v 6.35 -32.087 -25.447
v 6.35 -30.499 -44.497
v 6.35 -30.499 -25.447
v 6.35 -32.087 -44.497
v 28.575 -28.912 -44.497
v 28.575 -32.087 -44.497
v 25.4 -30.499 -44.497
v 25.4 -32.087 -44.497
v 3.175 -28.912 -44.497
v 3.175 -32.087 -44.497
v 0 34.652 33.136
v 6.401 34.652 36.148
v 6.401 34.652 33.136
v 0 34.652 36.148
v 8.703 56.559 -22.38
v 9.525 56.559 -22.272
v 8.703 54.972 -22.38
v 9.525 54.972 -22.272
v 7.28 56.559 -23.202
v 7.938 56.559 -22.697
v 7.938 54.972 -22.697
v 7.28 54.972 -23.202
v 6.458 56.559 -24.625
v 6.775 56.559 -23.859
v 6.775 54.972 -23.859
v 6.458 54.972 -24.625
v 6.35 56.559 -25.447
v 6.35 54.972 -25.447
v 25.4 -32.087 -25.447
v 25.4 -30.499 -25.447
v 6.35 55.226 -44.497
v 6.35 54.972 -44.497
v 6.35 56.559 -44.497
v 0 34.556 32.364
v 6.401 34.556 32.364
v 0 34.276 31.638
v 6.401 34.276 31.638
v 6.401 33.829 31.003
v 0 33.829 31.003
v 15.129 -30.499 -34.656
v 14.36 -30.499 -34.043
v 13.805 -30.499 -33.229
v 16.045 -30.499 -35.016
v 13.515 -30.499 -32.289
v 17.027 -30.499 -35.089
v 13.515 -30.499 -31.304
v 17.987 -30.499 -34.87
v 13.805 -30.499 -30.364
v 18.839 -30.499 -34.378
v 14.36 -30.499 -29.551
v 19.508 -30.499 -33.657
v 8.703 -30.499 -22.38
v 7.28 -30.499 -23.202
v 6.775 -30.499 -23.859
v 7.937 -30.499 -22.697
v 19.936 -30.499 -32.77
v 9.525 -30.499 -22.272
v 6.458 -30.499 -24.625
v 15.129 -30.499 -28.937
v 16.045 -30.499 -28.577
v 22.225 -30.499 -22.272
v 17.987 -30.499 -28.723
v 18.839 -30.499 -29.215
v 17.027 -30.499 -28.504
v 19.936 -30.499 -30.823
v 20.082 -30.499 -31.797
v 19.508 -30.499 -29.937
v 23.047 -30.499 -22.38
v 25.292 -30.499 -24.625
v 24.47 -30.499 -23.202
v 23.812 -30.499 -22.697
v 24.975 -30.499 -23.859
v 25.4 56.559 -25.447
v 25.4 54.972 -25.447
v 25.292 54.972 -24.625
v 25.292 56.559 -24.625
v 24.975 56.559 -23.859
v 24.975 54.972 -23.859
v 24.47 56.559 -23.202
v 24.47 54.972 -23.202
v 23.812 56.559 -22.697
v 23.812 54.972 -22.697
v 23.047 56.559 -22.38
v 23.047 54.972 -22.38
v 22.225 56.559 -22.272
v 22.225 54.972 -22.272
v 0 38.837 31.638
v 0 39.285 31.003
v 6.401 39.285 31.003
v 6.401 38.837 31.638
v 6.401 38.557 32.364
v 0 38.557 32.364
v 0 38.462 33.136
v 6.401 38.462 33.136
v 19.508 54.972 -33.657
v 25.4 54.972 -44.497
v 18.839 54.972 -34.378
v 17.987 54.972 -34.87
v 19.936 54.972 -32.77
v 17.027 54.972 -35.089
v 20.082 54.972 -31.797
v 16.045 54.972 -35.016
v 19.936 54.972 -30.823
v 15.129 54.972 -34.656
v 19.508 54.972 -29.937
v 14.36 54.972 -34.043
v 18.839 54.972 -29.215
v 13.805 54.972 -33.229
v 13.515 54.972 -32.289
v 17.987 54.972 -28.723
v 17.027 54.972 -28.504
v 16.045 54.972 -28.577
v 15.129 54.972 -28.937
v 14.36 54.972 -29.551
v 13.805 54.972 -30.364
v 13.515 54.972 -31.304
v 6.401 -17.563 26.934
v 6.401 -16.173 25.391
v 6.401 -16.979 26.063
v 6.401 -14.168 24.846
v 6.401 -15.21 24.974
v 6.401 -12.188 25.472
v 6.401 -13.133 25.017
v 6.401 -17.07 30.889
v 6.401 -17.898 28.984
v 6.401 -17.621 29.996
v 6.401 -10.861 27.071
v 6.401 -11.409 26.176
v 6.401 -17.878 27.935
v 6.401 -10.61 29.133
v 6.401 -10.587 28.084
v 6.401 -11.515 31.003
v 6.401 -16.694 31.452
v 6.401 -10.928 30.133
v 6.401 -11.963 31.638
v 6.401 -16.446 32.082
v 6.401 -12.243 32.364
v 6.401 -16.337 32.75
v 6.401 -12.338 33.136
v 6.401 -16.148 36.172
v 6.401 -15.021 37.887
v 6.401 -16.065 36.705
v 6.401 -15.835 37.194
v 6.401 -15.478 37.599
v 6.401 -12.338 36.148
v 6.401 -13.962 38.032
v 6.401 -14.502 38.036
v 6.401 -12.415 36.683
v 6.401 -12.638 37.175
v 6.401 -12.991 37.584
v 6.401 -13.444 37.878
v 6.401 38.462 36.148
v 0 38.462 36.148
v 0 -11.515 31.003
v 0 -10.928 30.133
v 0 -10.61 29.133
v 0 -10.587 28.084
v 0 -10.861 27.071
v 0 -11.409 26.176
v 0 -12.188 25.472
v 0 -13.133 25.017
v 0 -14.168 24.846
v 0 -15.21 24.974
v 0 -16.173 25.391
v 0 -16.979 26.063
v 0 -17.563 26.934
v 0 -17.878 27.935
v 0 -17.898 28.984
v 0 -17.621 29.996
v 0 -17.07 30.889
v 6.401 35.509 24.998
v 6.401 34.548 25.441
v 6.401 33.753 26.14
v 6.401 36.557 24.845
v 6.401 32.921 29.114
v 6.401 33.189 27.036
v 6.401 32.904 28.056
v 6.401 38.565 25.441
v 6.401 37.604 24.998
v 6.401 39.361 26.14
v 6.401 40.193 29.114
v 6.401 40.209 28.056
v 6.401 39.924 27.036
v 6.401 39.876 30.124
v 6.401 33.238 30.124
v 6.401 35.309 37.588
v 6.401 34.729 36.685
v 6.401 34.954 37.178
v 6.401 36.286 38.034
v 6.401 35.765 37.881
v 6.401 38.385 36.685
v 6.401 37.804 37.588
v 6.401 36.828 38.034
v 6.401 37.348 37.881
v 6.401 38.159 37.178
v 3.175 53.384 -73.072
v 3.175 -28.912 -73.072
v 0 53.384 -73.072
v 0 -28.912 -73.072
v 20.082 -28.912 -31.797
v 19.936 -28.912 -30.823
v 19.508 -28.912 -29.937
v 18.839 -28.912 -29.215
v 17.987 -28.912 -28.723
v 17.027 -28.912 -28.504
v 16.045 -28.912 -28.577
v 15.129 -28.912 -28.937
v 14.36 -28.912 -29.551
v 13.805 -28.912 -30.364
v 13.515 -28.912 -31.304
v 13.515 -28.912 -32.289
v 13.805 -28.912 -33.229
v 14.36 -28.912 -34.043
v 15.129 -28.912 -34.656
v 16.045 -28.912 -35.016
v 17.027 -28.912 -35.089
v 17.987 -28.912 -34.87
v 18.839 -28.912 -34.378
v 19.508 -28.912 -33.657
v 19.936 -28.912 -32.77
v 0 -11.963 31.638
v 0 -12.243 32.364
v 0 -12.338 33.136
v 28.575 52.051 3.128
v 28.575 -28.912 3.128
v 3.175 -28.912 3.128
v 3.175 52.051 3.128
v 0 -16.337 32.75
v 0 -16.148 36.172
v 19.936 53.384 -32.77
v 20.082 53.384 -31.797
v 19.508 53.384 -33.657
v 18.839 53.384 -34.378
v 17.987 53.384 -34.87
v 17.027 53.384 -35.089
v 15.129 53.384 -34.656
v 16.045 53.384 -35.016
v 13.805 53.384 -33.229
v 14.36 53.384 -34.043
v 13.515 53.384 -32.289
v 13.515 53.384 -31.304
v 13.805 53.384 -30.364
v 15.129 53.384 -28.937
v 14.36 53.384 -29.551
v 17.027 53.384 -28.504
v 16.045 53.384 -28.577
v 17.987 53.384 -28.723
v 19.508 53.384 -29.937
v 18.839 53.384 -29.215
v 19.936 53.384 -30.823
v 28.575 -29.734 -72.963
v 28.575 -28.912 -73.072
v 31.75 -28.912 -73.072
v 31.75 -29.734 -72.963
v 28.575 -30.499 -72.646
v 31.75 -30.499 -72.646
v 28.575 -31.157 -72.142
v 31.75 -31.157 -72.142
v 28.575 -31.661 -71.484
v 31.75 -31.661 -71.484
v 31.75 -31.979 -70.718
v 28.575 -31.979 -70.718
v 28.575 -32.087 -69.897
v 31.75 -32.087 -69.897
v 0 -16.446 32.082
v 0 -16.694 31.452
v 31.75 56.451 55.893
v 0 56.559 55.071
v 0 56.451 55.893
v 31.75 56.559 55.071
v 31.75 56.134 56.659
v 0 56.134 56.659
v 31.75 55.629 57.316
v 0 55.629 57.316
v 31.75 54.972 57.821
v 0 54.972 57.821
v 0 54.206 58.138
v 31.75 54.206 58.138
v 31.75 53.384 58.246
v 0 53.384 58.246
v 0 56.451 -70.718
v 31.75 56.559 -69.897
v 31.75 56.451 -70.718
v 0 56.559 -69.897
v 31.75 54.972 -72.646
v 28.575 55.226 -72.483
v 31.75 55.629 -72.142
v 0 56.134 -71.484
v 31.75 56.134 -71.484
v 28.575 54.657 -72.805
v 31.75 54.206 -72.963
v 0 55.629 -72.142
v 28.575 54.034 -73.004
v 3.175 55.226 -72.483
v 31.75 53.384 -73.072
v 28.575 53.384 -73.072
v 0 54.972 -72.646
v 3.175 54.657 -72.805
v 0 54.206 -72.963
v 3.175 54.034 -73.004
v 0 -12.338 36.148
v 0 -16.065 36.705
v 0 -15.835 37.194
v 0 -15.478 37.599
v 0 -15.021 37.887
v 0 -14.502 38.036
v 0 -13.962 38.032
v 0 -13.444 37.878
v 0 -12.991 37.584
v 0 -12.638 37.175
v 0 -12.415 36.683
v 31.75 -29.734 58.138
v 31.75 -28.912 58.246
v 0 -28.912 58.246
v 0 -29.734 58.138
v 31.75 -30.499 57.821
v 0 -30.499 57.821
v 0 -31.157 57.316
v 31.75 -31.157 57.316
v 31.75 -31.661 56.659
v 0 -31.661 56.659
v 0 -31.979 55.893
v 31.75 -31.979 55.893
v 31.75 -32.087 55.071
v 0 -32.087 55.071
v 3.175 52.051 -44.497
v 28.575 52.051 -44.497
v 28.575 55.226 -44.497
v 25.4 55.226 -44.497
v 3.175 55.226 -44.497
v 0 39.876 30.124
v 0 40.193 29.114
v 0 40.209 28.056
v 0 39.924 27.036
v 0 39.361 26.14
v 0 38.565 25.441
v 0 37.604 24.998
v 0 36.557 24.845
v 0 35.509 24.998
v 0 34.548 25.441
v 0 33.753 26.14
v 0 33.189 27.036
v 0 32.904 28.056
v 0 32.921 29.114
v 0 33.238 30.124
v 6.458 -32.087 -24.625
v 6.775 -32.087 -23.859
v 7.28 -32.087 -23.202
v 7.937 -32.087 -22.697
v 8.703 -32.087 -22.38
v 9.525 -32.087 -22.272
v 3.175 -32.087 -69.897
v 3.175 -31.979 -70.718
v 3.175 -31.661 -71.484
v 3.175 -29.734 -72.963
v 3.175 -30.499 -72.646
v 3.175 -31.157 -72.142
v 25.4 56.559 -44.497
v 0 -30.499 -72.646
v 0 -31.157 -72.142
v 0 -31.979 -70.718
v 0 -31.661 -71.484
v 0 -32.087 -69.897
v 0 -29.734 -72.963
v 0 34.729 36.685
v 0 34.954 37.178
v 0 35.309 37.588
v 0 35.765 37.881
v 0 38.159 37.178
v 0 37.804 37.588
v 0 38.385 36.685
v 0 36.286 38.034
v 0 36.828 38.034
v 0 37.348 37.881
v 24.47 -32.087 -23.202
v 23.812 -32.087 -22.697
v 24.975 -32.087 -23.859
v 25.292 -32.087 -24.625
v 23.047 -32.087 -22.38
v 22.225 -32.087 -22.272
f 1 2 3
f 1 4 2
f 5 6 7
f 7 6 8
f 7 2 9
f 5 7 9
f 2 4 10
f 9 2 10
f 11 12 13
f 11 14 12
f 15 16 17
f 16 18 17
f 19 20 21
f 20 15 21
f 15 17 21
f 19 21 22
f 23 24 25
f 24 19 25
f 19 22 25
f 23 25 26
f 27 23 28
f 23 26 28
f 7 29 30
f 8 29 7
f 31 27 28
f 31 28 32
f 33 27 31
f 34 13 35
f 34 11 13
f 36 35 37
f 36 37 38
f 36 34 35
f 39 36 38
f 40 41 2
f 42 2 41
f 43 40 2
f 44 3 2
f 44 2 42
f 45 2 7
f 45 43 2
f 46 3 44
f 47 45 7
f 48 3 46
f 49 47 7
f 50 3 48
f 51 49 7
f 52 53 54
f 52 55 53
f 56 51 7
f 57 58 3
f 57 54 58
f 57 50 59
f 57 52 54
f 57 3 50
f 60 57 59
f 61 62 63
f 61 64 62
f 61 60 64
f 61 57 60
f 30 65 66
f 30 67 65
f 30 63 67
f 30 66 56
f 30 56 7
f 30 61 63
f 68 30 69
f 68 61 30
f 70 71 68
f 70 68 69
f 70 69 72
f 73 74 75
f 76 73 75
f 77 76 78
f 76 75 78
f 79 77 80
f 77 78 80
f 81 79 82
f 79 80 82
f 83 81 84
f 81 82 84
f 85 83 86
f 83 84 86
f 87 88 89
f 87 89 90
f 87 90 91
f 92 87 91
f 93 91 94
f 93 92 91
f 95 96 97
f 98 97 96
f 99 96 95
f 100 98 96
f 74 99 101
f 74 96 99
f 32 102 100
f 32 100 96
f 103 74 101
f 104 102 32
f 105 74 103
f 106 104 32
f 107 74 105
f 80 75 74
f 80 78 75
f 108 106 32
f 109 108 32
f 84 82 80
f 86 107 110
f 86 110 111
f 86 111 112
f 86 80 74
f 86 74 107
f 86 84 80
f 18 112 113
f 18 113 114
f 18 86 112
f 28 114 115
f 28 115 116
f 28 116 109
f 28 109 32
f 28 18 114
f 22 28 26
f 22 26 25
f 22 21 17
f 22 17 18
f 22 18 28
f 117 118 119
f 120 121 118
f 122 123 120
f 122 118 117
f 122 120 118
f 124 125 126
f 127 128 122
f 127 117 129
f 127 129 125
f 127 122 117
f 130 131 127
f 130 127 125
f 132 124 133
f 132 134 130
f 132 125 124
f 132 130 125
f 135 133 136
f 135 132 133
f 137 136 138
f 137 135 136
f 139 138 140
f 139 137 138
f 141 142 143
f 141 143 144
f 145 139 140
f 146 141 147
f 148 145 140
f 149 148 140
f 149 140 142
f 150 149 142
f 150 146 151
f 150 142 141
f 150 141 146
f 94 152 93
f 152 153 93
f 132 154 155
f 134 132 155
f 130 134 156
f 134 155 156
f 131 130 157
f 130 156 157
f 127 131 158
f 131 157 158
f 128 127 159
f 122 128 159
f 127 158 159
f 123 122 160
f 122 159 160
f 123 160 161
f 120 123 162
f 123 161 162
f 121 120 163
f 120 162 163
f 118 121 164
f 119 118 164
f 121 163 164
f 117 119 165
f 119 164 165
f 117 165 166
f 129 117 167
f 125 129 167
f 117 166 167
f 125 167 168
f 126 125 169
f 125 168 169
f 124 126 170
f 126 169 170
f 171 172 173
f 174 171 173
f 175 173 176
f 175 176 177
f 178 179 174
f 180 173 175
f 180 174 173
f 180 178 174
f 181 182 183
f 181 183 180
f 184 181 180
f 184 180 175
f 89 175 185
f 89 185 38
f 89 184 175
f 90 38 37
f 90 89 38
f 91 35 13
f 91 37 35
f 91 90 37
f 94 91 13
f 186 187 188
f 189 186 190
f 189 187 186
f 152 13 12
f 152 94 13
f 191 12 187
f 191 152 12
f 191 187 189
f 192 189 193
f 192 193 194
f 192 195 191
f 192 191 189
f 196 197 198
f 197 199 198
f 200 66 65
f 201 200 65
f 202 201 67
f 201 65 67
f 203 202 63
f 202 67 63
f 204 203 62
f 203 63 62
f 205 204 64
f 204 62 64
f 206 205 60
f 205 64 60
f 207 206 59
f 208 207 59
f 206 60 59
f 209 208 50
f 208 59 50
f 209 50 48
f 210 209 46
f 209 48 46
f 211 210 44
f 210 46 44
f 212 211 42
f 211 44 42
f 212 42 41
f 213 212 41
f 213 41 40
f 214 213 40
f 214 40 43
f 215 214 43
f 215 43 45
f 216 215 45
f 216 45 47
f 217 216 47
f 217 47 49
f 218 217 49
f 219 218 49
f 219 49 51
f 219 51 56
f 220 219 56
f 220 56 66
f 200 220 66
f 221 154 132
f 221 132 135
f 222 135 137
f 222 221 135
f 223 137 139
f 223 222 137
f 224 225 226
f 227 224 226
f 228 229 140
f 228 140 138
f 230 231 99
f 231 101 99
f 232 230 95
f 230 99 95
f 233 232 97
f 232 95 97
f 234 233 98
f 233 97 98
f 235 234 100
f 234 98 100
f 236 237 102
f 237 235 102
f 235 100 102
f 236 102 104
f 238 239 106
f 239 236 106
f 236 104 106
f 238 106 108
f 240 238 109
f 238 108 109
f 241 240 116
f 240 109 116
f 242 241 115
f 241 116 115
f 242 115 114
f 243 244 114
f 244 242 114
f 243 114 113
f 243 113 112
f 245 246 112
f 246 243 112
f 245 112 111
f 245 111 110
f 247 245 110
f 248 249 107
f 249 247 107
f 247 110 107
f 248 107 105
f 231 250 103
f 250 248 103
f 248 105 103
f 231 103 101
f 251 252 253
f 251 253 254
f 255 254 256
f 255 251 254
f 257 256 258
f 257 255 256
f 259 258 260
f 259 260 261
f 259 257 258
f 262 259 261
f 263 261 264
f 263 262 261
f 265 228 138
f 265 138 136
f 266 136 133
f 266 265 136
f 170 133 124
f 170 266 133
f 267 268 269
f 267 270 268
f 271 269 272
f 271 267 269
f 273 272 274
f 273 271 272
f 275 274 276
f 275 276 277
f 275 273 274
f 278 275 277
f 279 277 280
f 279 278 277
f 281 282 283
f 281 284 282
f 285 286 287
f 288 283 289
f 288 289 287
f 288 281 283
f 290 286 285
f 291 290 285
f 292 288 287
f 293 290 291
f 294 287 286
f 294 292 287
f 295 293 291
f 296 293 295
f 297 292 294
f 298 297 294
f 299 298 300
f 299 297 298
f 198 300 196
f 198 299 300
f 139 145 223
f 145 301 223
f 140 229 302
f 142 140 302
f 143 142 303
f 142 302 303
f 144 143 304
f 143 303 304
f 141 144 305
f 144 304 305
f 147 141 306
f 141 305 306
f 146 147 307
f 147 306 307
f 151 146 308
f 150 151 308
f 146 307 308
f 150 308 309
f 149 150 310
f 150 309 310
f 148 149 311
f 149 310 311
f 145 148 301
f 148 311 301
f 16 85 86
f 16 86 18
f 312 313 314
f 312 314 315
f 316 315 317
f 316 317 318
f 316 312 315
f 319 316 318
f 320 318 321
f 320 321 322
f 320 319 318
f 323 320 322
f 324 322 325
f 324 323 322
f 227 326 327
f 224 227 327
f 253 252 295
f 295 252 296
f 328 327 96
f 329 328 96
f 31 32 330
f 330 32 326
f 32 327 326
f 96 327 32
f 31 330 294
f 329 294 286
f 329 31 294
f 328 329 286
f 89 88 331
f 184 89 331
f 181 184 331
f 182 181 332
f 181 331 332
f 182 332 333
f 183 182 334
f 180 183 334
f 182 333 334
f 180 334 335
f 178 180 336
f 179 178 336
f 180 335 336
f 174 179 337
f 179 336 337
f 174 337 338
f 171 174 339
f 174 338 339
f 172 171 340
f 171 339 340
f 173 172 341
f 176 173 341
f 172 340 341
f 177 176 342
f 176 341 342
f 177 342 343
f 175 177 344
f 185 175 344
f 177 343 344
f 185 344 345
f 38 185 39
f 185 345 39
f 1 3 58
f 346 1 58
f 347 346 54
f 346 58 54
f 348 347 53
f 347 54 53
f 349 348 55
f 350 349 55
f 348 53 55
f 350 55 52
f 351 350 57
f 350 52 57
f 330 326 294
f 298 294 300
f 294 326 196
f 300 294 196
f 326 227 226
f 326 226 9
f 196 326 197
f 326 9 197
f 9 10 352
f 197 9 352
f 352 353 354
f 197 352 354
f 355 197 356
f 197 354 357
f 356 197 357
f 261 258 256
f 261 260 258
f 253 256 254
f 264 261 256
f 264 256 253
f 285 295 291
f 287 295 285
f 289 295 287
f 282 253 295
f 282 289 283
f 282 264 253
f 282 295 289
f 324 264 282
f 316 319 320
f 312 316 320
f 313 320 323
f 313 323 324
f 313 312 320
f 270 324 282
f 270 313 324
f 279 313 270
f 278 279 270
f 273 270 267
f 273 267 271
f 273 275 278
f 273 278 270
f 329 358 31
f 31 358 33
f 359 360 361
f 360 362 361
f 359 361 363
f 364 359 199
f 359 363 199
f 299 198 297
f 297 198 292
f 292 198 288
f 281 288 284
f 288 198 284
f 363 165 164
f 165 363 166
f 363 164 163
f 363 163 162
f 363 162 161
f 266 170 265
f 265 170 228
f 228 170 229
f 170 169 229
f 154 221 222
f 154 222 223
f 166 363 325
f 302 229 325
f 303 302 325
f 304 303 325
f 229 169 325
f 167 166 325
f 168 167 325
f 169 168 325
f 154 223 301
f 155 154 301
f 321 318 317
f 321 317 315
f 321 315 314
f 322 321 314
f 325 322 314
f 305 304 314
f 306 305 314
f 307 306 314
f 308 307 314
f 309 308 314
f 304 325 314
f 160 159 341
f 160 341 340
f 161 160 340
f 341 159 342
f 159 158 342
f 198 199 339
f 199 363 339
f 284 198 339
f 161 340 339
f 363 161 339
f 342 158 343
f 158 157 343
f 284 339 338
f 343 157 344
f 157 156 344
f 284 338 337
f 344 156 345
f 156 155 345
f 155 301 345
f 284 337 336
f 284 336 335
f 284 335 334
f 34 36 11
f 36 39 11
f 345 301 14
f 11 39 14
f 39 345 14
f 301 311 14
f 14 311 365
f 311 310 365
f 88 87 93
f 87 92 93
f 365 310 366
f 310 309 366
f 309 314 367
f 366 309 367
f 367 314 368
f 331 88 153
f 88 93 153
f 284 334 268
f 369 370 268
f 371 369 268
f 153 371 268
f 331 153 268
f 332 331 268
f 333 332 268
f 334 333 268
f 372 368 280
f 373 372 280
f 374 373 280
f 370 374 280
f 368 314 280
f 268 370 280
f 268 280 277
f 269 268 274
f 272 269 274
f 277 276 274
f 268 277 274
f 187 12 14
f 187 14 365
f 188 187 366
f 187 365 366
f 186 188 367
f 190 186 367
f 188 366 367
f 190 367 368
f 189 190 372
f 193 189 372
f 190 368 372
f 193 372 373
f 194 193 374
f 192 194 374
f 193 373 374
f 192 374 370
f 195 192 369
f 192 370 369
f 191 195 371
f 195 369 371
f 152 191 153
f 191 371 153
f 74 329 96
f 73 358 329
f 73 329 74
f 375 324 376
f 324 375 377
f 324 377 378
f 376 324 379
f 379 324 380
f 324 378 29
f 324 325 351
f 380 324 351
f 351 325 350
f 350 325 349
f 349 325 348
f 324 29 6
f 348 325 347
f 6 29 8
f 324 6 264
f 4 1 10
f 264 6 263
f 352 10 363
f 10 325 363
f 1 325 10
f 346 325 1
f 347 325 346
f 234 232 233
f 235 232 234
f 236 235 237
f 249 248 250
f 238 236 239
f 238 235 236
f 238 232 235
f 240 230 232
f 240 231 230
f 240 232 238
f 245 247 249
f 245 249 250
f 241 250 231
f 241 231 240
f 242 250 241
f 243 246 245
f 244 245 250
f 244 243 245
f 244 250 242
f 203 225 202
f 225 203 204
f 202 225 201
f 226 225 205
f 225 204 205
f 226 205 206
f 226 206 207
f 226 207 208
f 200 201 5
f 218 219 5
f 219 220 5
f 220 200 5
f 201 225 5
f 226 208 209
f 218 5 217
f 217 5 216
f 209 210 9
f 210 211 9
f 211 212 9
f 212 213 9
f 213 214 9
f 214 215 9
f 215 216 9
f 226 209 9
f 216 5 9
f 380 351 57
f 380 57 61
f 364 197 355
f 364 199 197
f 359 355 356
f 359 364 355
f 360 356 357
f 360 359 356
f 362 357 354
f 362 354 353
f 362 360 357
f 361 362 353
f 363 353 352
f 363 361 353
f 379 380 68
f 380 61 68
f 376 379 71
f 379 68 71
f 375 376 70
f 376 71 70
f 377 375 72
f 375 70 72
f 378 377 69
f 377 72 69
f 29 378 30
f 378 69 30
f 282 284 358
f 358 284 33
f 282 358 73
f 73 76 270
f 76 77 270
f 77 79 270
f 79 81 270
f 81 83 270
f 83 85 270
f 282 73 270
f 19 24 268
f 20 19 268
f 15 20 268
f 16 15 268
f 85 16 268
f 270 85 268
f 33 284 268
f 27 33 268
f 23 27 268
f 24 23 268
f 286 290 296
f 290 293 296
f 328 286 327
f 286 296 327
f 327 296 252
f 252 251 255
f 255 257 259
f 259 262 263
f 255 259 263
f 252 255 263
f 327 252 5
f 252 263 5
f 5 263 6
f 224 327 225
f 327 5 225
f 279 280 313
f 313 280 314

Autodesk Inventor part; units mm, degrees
ref_plane "YZ Plane" through (0, 0, 0) normal (1, 0, 0) x (0, 1, 0)
ref_plane "XZ Plane" through (0, 0, 0) normal (0, 1, 0) x (-1, 0, 0)
ref_plane "XY Plane" through (0, 0, 0) normal (0, 0, 1) x (1, 0, 0)
sketch "Sketch1" plane through (0, 0, 0) normal (1, 0, 0) x (0, 1, 0)
  line L0 (56.5592, 58.2464) -> (-32.0868, 58.2464)
  line L1 (-32.0868, 58.2464) -> (-32.0868, -73.0716)
  line L2 (-32.0868, -73.0716) -> (56.5592, -73.0716)
  line L3 (56.5592, -73.0716) -> (56.5592, 58.2464)
  point P0 (0, 0)
  dimension "d0" = 131.318
  dimension "d1" = 88.646
extrude "Extrusion1" add sketch "Sketch1" along normal blind 31.75
sketch "Sketch2" plane through (0, -32.0868, -73.0716) normal (0, -1, 0) x (1, 0, 0)
  line L0 (31.75, 131.318) -> (31.75, 0) projected
  line L1 (0, 131.318) -> (0, 0) projected
  line L2 (28.575, 28.575) -> (3.175, 28.575)
  line L3 (3.175, 28.575) -> (3.175, 0)
  line L4 (3.175, 0) -> (28.575, 0)
  line L5 (28.575, 0) -> (28.575, 28.575)
  point P0 (0, 73.0716)
  point P1 (31.75, 28.575)
  dimension "d7" = 3.175
  dimension "d8" = 3.175
  dimension "d9" = 28.575
extrude "Extrusion2" cut sketch "Sketch2" against normal blind 87.3125
sketch "Sketch3" plane through (28.575, -32.0868, -44.4966) normal (0, 0, -1) x (-1, 0, 0)
  line L0 (0, 0) -> (0, 87.3125) projected
  line L1 (25.4, 0) -> (25.4, 87.3125) projected
  line L2 (0, 3.175) -> (25.4, 3.175)
  line L3 (25.4, 3.175) -> (25.4, 84.1375)
  line L4 (25.4, 84.1375) -> (0, 84.1375)
  line L5 (0, 84.1375) -> (0, 3.175)
  line L6 (0, 87.3125) -> (25.4, 87.3125) projected
  line L7 (25.4, 0) -> (0, 0) projected
  point P0 (28.575, 32.0868)
  point P1 (12.7, 84.1375)
  point P2 (12.7, 3.175)
  point P3 (0, 84.1375)
  point P4 (25.4, 3.175)
  dimension "d10" = 3.175
  dimension "d11" = 3.175
extrude "Extrusion3" cut sketch "Sketch3" against normal blind 47.625 contours L0 L4 L1 L2
sketch "Sketch4" plane through (0, -32.0868, -73.0716) normal (0, -1, 0) x (1, 0, 0)
  line L0 (3.175, 28.575) -> (28.575, 28.575) projected
  line L1 (25.4, 28.575) -> (6.35, 28.575)
  line L2 (6.35, 28.575) -> (6.35, 50.8)
  line L3 (6.35, 50.8) -> (25.4, 50.8)
  line L4 (25.4, 50.8) -> (25.4, 28.575)
  line L5 (31.75, 131.318) -> (31.75, 0) projected
  circle A0 centre (16.7802, 41.275) radius 3.302
  point P0 (0, 73.0716)
  point P1 (15.875, 50.8)
  point P2 (15.875, 28.575)
  point P3 (25.4, 39.6875)
  point P4 (6.35, 28.575)
  dimension "d14" = 22.225
  dimension "d15" = 19.05
  dimension "d16" = 6.35
  dimension "d17" = 6.604
  dimension "d18" = 12.7
extrude "Extrusion4" cut sketch "Sketch4" against normal blind 1.5875
sketch "Sketch6" plane through (0, -30.4993, -73.0716) normal (0, -1, 0) x (1, 0, 0)
  circle A0 centre (16.7802, 41.275) radius 3.302 projected
  circle A1 centre (16.7802, 41.275) radius 3.302
  point P0 (0, 73.0716)
extrude "Extrusion5" cut sketch "Sketch6" along normal mid plane 3.175
ref_plane "Work Plane2" through (0, 12.2362, -73.0716) normal (0, -1, 0) x (1, 0, 0)
mirror "Mirror1" about plane through (0, 12.2362, -73.0716) normal (0, -1, 0) of "Extrusion4"
mirror "Mirror2" about plane through (0, 12.2362, -73.0716) normal (0, -1, 0) of "Extrusion5"
fillet "Fillet1" radius 3.175 3 edges at (30.1625, -32.0868, -73.0716) (1.5875, -32.0868, -73.0716) (15.875, 56.5592, -73.0716)
fillet "Fillet2" radius 3.175 2 edges at (15.875, -32.0868, 58.2464) (15.875, 56.5592, 58.2464)
fillet "Fillet3" radius 3.175 4 edges at (6.35, -31.293, -22.2716) (25.4, -31.293, -22.2716) (25.4, 55.7655, -22.2716) (6.35, 55.7655, -22.2716)
sketch "Sketch8" plane through (0, 0, 0) normal (-1, 0, 0) x (0, 0, 1)
  line L0 (-69.8966, 56.5592) -> (55.0714, 56.5592) projected
  line L1 (-73.0716, -28.9118) -> (-73.0716, 53.3842) projected
  arc A0 (31.0026, -11.5151) -> (30.8894, -17.07) centre (28.5284, -14.2433) ccw
  arc A1 (36.1718, -16.1481) -> (36.1484, -12.3383) centre (36.1484, -14.2433) ccw
  line L2 (36.1484, -12.3383) -> (33.1356, -12.3383)
  line L3 (36.1718, -16.1481) -> (32.75, -16.3367)
  arc A2 (31.0026, -11.5151) -> (33.1356, -12.3383) centre (33.1356, -9.1633) ccw
  arc A3 (32.75, -16.3367) -> (30.8894, -17.07) centre (32.9247, -19.5068) ccw
  line L4 (55.0714, -32.0868) -> (-69.8966, -32.0868) projected
  arc A4 (31.0026, 39.2849) -> (31.0026, 33.8286) centre (28.5284, 36.5567) ccw
  arc A5 (36.1484, 34.6517) -> (36.1484, 38.4617) centre (36.1484, 36.5567) ccw
  line L5 (36.1484, 38.4617) -> (33.1356, 38.4617)
  line L6 (36.1484, 34.6517) -> (33.1356, 34.6517)
  arc A6 (31.0026, 39.2849) -> (33.1356, 38.4617) centre (33.1356, 41.6367) ccw
  arc A7 (33.1356, 34.6517) -> (31.0026, 33.8286) centre (33.1356, 31.4767) ccw
  point P0 (0, 0)
  point P1 (31.6805, -12.3383)
  point P2 (31.5103, -16.405)
  point P3 (31.8314, 36.8525)
  point P4 (31.2779, 32.7727)
  point P5 (31.6805, 38.4617)
  point P6 (31.6805, 34.6517)
  dimension "d57" = 3.81
  dimension "d58" = 7.366
  dimension "d59" = 3.175
  dimension "d60" = 101.6
  dimension "d61" = 109.22
  dimension "d63" = 0
  dimension "d77" = 101.6
  dimension "d78" = 109.22
  dimension "d79" = 50.8
  dimension "d80" = 20.0025
  dimension "d81" = 3.81
  dimension "d82" = 7.366
  dimension "d83" = 3.175
extrude "Extrusion7" cut sketch "Sketch8" against normal blind 6.4008
properties part number "cDAQ_Chassis_LowPolyPlaceholder"
